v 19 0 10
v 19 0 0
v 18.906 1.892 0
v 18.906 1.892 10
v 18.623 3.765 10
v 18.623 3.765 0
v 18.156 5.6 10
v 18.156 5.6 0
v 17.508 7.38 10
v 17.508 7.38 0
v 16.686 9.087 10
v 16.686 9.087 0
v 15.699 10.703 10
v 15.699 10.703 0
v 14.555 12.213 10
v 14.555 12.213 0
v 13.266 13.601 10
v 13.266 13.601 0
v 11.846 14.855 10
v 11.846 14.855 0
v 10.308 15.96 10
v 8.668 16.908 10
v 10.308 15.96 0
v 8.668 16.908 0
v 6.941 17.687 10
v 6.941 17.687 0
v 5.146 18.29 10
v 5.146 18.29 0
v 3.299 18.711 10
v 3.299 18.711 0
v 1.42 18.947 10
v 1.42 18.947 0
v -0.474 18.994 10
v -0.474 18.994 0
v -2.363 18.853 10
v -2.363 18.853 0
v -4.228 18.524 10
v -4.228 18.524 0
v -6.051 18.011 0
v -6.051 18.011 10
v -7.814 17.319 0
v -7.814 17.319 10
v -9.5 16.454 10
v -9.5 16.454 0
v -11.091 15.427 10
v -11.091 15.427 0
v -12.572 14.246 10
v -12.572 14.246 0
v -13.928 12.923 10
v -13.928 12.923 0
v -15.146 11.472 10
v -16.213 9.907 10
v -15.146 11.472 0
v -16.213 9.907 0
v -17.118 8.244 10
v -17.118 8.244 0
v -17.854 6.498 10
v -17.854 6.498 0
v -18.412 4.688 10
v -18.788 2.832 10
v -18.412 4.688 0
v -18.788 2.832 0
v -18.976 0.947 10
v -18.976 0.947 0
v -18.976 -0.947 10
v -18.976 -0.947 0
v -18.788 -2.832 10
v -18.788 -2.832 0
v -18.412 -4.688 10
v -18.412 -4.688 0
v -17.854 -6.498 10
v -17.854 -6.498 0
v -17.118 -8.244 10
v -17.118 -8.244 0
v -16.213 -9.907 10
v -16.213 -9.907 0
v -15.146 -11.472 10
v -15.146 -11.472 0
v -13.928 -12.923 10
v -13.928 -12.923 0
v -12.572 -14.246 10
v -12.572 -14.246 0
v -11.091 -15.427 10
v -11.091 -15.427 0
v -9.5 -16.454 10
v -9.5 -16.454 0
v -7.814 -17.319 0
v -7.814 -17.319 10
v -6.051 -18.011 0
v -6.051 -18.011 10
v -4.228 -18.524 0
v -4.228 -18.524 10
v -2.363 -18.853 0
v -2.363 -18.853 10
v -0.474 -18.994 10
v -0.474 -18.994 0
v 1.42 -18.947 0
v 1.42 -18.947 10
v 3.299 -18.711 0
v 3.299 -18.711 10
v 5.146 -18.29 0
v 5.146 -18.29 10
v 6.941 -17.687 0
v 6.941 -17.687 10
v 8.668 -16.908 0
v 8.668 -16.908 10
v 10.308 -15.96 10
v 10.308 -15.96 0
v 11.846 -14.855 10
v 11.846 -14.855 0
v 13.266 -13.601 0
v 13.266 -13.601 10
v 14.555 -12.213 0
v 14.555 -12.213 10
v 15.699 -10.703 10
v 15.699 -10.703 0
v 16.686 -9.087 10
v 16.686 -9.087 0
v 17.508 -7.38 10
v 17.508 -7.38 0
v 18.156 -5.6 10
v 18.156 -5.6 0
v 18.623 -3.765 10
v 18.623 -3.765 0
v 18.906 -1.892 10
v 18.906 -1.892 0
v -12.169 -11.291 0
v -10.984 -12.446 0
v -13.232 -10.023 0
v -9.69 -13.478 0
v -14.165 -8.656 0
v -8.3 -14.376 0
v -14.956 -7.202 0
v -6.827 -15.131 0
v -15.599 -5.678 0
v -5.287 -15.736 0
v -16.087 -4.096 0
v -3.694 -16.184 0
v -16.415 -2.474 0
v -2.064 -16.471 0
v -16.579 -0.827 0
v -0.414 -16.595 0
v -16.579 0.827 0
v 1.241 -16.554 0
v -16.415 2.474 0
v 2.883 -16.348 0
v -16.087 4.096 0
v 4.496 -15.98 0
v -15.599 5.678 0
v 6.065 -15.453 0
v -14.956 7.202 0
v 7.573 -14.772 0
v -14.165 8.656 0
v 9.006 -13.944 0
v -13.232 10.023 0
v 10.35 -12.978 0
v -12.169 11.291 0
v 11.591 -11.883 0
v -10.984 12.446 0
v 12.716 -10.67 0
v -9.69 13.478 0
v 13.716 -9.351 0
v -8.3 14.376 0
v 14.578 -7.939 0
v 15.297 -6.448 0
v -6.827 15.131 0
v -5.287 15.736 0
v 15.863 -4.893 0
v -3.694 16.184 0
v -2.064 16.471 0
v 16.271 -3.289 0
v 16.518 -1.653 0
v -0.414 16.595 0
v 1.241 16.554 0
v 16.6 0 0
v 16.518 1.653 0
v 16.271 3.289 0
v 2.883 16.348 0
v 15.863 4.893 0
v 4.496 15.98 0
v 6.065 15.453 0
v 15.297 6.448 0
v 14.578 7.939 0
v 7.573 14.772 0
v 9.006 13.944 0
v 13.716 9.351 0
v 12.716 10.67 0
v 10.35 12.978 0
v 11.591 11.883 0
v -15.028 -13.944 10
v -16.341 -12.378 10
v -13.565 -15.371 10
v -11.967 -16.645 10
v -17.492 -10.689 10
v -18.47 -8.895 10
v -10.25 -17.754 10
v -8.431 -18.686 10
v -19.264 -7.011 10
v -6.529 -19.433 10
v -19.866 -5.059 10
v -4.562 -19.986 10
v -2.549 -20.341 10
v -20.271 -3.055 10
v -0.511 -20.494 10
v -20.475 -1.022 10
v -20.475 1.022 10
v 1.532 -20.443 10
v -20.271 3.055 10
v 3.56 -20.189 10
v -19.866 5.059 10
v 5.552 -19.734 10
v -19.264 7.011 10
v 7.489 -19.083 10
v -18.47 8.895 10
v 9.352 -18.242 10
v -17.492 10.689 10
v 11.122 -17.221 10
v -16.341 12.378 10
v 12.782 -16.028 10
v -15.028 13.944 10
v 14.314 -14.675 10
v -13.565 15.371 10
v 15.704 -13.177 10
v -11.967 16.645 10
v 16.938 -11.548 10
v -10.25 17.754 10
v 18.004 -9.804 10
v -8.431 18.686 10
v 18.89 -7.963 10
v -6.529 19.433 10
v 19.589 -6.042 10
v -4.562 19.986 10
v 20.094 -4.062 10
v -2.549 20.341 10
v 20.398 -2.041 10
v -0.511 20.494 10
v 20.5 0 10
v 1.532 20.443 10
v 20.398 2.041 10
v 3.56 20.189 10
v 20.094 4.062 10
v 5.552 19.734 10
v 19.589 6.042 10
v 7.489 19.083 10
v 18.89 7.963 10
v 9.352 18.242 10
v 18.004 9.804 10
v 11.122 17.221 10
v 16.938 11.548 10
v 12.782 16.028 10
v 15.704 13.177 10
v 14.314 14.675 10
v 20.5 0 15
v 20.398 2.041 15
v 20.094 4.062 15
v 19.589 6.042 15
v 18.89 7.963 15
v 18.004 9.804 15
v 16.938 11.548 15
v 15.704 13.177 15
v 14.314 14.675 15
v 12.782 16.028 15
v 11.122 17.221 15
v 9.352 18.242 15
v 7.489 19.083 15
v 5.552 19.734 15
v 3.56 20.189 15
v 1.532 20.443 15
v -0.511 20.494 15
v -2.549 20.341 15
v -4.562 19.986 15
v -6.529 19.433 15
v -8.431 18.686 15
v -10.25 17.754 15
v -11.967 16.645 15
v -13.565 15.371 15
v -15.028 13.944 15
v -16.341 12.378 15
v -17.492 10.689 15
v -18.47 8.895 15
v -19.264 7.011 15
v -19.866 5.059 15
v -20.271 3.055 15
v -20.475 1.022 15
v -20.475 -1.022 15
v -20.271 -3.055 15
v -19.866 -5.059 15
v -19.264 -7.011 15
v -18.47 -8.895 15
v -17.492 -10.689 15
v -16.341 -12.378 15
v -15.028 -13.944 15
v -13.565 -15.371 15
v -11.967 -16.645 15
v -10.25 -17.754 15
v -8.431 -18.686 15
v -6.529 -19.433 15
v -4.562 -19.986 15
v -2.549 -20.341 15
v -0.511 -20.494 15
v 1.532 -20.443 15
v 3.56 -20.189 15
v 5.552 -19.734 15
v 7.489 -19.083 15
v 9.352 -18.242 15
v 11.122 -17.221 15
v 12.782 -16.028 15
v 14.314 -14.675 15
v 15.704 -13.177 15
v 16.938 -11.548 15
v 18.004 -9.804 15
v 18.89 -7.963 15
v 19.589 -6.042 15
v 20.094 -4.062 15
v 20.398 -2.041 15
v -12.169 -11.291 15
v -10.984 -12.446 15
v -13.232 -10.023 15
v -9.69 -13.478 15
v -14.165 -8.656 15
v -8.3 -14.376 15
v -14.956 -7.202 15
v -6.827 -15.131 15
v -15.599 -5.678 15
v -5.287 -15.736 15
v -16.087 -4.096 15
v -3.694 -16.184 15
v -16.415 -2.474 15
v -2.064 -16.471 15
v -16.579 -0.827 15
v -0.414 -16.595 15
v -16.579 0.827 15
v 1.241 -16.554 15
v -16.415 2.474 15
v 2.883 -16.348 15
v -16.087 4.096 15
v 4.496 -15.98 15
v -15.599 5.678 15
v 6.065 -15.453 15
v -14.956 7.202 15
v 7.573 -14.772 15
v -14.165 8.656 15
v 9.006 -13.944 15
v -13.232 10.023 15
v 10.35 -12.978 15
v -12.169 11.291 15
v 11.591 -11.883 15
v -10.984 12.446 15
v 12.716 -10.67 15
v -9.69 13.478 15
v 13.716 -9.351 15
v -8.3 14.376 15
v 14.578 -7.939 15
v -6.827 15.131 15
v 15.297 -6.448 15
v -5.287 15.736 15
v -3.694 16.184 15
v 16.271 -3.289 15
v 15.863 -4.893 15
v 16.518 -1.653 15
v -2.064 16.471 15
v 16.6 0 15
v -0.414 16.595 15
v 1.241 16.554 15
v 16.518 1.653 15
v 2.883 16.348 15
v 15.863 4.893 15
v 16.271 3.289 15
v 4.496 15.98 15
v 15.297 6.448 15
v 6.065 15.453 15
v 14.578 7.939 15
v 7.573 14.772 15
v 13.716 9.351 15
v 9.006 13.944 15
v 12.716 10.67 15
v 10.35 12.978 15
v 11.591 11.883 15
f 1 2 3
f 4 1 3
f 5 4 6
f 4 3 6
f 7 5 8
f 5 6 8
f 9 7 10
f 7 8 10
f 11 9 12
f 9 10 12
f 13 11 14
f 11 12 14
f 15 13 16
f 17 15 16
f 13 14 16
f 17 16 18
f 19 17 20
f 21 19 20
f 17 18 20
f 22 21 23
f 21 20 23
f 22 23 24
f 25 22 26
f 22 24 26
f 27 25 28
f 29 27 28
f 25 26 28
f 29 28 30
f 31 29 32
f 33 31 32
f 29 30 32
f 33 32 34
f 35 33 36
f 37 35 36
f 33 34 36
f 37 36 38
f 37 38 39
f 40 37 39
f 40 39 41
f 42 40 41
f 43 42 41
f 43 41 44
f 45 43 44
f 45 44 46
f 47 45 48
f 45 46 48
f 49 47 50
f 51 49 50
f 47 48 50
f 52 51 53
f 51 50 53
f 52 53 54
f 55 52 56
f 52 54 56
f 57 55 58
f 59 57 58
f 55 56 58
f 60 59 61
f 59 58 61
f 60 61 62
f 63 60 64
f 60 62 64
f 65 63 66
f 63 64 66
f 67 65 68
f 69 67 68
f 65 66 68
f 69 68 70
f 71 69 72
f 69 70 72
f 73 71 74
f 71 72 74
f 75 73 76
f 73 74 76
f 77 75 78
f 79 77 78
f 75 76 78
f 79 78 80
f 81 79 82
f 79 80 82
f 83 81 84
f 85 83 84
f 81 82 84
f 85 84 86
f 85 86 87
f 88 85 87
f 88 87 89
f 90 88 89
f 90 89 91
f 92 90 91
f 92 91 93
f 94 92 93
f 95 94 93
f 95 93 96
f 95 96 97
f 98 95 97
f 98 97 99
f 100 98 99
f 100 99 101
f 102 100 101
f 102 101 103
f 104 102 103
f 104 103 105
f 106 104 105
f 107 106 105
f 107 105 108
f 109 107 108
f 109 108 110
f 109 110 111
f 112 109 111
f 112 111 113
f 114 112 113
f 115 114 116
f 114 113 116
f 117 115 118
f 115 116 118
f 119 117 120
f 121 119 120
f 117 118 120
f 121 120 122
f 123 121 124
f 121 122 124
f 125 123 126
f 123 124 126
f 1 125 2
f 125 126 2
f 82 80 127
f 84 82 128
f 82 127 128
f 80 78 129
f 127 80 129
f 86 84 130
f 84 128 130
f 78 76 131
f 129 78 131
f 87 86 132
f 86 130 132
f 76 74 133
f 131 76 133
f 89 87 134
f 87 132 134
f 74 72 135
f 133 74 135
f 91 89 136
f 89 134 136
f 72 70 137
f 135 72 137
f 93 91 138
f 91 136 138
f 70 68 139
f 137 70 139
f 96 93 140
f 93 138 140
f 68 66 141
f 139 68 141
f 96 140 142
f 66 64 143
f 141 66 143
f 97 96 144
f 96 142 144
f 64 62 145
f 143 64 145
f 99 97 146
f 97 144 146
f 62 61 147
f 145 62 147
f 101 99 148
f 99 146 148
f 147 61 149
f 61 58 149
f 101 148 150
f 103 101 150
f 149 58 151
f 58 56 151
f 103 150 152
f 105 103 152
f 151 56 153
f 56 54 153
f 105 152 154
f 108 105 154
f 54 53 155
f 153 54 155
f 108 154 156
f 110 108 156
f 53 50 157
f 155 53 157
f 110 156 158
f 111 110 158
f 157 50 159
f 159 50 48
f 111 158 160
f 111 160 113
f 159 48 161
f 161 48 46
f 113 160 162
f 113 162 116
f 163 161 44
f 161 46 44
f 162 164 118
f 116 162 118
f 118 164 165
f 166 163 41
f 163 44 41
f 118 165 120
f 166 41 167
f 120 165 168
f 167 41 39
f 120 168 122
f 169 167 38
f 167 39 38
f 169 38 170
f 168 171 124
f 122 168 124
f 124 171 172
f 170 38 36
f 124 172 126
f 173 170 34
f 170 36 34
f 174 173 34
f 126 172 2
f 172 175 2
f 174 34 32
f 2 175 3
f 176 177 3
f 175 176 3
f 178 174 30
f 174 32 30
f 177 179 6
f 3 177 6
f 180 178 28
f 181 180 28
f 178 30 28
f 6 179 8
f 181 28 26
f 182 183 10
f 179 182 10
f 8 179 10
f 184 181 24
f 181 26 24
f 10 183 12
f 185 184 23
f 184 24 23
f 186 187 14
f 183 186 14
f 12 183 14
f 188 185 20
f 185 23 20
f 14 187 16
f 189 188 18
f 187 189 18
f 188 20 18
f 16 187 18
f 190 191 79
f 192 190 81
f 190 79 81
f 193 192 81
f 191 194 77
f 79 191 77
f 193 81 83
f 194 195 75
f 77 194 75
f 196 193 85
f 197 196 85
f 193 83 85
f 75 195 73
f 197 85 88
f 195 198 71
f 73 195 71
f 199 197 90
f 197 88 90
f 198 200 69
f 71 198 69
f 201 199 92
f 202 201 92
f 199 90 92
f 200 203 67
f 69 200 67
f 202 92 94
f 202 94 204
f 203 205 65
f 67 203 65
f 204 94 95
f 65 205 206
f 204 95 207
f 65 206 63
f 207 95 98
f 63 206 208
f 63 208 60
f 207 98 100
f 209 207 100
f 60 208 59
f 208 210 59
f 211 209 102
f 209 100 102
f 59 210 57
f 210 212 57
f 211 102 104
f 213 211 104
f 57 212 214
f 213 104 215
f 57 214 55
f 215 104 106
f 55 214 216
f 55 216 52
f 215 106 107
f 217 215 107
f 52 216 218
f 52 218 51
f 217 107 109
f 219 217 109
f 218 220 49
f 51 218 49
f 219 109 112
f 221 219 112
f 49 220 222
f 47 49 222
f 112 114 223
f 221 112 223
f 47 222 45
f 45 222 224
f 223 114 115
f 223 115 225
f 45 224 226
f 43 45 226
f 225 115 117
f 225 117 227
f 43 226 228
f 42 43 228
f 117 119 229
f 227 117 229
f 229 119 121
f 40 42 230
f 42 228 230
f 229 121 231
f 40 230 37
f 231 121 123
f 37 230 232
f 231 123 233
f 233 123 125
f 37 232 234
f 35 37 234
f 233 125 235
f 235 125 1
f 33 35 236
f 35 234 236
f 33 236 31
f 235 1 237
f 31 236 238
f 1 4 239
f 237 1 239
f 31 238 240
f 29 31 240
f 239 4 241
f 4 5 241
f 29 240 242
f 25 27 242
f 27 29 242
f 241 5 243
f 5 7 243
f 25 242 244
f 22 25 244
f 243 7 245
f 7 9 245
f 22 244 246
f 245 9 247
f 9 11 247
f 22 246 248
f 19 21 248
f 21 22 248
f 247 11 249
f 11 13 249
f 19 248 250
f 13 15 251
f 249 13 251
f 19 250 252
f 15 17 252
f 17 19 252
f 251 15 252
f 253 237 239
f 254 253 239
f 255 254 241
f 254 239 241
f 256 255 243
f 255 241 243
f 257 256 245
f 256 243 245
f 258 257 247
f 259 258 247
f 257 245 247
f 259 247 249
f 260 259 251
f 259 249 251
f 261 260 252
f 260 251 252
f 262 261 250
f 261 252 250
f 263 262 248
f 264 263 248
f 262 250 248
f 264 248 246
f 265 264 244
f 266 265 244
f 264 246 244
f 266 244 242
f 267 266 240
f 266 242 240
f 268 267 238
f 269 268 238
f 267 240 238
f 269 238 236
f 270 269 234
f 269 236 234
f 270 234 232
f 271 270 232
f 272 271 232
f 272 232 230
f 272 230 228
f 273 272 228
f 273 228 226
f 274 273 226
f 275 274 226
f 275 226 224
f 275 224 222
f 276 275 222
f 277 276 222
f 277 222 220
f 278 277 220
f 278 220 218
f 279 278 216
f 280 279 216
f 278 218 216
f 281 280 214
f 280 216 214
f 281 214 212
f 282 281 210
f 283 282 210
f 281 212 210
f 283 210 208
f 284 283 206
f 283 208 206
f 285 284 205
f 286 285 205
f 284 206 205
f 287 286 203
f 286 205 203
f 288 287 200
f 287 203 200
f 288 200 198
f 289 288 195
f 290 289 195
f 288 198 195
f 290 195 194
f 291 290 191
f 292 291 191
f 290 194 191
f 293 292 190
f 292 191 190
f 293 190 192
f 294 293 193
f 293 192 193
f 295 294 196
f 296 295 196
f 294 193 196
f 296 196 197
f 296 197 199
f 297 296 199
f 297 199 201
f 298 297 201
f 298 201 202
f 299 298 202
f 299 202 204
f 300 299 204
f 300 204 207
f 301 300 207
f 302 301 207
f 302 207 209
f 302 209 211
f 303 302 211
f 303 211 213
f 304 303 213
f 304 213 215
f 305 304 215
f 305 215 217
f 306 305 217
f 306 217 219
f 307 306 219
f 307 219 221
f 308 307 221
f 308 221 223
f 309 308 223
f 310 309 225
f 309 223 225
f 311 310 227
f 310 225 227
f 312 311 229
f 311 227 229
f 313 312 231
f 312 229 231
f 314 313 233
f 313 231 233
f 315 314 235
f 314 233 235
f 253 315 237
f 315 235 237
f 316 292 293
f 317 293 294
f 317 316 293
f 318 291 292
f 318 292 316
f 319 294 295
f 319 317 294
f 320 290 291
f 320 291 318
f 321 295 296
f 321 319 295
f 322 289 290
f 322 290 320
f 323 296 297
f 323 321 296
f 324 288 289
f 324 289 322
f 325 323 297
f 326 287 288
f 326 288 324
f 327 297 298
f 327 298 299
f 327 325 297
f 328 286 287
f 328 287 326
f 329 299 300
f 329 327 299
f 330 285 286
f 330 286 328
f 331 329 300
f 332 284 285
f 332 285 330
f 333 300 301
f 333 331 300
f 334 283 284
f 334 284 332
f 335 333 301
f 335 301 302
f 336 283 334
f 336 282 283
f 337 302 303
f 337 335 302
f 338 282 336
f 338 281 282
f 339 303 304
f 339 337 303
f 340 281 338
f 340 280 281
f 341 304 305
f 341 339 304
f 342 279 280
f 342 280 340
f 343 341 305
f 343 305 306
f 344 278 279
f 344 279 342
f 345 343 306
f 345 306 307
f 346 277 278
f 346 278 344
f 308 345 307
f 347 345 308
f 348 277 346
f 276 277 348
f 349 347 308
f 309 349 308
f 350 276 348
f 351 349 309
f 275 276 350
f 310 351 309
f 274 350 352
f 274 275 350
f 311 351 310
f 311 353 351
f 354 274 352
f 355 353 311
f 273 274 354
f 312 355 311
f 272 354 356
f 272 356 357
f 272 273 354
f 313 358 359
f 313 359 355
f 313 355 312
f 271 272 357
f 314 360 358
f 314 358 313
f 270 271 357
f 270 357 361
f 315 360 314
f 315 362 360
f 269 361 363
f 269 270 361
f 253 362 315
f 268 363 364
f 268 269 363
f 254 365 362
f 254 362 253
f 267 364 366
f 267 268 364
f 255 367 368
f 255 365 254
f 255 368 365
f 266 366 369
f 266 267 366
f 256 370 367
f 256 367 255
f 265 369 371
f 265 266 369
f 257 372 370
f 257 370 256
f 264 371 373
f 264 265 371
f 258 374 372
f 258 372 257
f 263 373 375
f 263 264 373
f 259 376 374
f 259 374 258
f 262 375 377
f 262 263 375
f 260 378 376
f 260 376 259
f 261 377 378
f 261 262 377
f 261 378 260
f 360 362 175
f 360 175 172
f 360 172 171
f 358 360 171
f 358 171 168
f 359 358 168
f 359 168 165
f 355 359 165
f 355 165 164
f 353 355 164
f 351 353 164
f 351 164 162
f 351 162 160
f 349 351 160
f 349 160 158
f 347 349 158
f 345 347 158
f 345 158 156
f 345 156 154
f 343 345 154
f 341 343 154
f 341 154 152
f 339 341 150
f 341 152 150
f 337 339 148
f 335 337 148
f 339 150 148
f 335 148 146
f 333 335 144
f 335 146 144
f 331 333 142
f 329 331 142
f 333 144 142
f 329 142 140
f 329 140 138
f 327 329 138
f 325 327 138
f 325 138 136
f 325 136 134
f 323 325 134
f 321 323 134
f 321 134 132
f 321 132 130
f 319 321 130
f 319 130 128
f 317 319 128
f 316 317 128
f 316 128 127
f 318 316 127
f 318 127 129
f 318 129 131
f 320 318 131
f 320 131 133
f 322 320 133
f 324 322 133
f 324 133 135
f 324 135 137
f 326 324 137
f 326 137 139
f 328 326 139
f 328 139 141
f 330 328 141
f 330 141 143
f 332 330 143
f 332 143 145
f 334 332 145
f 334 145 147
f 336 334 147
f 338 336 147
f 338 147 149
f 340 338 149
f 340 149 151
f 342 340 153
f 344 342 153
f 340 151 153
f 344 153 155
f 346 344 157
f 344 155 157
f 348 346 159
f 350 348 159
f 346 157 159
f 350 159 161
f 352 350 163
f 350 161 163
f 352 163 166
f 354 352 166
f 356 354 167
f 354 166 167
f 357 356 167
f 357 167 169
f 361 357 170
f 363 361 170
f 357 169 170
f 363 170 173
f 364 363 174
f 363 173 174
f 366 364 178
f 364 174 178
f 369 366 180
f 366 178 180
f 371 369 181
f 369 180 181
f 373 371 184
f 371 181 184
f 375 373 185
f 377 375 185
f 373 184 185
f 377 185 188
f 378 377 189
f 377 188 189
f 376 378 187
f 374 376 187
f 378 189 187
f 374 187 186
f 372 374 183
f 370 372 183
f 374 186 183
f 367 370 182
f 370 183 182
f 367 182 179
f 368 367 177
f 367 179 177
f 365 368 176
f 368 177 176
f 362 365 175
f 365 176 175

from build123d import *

# Parameters (mm, degrees)
F0_R     = 19
F1_DEPTH = 10
F2_R     = 20.5
F3_DEPTH = 5
F4_R     = 16.6
F5_DEPTH = 15.001


with BuildPart() as f1:
    # F0 (on Top) → F1 (new body)
    with BuildSketch(Plane.XY):
        Circle(F0_R)
    extrude(amount=F1_DEPTH)

    # F2 (on face) → F3 (join)
    with BuildSketch(Plane.XY.offset(10)):
        Circle(F2_R)
    extrude(amount=F3_DEPTH)

    # F4 (on face) → F5 (cut, through all)
    with BuildSketch(Plane(origin=(0, 0, 0), x_dir=(1, 0, 0), z_dir=(0, 0, -1))):
        Circle(F4_R)
    extrude(amount=-F5_DEPTH, mode=Mode.SUBTRACT)


solid = f1.part
